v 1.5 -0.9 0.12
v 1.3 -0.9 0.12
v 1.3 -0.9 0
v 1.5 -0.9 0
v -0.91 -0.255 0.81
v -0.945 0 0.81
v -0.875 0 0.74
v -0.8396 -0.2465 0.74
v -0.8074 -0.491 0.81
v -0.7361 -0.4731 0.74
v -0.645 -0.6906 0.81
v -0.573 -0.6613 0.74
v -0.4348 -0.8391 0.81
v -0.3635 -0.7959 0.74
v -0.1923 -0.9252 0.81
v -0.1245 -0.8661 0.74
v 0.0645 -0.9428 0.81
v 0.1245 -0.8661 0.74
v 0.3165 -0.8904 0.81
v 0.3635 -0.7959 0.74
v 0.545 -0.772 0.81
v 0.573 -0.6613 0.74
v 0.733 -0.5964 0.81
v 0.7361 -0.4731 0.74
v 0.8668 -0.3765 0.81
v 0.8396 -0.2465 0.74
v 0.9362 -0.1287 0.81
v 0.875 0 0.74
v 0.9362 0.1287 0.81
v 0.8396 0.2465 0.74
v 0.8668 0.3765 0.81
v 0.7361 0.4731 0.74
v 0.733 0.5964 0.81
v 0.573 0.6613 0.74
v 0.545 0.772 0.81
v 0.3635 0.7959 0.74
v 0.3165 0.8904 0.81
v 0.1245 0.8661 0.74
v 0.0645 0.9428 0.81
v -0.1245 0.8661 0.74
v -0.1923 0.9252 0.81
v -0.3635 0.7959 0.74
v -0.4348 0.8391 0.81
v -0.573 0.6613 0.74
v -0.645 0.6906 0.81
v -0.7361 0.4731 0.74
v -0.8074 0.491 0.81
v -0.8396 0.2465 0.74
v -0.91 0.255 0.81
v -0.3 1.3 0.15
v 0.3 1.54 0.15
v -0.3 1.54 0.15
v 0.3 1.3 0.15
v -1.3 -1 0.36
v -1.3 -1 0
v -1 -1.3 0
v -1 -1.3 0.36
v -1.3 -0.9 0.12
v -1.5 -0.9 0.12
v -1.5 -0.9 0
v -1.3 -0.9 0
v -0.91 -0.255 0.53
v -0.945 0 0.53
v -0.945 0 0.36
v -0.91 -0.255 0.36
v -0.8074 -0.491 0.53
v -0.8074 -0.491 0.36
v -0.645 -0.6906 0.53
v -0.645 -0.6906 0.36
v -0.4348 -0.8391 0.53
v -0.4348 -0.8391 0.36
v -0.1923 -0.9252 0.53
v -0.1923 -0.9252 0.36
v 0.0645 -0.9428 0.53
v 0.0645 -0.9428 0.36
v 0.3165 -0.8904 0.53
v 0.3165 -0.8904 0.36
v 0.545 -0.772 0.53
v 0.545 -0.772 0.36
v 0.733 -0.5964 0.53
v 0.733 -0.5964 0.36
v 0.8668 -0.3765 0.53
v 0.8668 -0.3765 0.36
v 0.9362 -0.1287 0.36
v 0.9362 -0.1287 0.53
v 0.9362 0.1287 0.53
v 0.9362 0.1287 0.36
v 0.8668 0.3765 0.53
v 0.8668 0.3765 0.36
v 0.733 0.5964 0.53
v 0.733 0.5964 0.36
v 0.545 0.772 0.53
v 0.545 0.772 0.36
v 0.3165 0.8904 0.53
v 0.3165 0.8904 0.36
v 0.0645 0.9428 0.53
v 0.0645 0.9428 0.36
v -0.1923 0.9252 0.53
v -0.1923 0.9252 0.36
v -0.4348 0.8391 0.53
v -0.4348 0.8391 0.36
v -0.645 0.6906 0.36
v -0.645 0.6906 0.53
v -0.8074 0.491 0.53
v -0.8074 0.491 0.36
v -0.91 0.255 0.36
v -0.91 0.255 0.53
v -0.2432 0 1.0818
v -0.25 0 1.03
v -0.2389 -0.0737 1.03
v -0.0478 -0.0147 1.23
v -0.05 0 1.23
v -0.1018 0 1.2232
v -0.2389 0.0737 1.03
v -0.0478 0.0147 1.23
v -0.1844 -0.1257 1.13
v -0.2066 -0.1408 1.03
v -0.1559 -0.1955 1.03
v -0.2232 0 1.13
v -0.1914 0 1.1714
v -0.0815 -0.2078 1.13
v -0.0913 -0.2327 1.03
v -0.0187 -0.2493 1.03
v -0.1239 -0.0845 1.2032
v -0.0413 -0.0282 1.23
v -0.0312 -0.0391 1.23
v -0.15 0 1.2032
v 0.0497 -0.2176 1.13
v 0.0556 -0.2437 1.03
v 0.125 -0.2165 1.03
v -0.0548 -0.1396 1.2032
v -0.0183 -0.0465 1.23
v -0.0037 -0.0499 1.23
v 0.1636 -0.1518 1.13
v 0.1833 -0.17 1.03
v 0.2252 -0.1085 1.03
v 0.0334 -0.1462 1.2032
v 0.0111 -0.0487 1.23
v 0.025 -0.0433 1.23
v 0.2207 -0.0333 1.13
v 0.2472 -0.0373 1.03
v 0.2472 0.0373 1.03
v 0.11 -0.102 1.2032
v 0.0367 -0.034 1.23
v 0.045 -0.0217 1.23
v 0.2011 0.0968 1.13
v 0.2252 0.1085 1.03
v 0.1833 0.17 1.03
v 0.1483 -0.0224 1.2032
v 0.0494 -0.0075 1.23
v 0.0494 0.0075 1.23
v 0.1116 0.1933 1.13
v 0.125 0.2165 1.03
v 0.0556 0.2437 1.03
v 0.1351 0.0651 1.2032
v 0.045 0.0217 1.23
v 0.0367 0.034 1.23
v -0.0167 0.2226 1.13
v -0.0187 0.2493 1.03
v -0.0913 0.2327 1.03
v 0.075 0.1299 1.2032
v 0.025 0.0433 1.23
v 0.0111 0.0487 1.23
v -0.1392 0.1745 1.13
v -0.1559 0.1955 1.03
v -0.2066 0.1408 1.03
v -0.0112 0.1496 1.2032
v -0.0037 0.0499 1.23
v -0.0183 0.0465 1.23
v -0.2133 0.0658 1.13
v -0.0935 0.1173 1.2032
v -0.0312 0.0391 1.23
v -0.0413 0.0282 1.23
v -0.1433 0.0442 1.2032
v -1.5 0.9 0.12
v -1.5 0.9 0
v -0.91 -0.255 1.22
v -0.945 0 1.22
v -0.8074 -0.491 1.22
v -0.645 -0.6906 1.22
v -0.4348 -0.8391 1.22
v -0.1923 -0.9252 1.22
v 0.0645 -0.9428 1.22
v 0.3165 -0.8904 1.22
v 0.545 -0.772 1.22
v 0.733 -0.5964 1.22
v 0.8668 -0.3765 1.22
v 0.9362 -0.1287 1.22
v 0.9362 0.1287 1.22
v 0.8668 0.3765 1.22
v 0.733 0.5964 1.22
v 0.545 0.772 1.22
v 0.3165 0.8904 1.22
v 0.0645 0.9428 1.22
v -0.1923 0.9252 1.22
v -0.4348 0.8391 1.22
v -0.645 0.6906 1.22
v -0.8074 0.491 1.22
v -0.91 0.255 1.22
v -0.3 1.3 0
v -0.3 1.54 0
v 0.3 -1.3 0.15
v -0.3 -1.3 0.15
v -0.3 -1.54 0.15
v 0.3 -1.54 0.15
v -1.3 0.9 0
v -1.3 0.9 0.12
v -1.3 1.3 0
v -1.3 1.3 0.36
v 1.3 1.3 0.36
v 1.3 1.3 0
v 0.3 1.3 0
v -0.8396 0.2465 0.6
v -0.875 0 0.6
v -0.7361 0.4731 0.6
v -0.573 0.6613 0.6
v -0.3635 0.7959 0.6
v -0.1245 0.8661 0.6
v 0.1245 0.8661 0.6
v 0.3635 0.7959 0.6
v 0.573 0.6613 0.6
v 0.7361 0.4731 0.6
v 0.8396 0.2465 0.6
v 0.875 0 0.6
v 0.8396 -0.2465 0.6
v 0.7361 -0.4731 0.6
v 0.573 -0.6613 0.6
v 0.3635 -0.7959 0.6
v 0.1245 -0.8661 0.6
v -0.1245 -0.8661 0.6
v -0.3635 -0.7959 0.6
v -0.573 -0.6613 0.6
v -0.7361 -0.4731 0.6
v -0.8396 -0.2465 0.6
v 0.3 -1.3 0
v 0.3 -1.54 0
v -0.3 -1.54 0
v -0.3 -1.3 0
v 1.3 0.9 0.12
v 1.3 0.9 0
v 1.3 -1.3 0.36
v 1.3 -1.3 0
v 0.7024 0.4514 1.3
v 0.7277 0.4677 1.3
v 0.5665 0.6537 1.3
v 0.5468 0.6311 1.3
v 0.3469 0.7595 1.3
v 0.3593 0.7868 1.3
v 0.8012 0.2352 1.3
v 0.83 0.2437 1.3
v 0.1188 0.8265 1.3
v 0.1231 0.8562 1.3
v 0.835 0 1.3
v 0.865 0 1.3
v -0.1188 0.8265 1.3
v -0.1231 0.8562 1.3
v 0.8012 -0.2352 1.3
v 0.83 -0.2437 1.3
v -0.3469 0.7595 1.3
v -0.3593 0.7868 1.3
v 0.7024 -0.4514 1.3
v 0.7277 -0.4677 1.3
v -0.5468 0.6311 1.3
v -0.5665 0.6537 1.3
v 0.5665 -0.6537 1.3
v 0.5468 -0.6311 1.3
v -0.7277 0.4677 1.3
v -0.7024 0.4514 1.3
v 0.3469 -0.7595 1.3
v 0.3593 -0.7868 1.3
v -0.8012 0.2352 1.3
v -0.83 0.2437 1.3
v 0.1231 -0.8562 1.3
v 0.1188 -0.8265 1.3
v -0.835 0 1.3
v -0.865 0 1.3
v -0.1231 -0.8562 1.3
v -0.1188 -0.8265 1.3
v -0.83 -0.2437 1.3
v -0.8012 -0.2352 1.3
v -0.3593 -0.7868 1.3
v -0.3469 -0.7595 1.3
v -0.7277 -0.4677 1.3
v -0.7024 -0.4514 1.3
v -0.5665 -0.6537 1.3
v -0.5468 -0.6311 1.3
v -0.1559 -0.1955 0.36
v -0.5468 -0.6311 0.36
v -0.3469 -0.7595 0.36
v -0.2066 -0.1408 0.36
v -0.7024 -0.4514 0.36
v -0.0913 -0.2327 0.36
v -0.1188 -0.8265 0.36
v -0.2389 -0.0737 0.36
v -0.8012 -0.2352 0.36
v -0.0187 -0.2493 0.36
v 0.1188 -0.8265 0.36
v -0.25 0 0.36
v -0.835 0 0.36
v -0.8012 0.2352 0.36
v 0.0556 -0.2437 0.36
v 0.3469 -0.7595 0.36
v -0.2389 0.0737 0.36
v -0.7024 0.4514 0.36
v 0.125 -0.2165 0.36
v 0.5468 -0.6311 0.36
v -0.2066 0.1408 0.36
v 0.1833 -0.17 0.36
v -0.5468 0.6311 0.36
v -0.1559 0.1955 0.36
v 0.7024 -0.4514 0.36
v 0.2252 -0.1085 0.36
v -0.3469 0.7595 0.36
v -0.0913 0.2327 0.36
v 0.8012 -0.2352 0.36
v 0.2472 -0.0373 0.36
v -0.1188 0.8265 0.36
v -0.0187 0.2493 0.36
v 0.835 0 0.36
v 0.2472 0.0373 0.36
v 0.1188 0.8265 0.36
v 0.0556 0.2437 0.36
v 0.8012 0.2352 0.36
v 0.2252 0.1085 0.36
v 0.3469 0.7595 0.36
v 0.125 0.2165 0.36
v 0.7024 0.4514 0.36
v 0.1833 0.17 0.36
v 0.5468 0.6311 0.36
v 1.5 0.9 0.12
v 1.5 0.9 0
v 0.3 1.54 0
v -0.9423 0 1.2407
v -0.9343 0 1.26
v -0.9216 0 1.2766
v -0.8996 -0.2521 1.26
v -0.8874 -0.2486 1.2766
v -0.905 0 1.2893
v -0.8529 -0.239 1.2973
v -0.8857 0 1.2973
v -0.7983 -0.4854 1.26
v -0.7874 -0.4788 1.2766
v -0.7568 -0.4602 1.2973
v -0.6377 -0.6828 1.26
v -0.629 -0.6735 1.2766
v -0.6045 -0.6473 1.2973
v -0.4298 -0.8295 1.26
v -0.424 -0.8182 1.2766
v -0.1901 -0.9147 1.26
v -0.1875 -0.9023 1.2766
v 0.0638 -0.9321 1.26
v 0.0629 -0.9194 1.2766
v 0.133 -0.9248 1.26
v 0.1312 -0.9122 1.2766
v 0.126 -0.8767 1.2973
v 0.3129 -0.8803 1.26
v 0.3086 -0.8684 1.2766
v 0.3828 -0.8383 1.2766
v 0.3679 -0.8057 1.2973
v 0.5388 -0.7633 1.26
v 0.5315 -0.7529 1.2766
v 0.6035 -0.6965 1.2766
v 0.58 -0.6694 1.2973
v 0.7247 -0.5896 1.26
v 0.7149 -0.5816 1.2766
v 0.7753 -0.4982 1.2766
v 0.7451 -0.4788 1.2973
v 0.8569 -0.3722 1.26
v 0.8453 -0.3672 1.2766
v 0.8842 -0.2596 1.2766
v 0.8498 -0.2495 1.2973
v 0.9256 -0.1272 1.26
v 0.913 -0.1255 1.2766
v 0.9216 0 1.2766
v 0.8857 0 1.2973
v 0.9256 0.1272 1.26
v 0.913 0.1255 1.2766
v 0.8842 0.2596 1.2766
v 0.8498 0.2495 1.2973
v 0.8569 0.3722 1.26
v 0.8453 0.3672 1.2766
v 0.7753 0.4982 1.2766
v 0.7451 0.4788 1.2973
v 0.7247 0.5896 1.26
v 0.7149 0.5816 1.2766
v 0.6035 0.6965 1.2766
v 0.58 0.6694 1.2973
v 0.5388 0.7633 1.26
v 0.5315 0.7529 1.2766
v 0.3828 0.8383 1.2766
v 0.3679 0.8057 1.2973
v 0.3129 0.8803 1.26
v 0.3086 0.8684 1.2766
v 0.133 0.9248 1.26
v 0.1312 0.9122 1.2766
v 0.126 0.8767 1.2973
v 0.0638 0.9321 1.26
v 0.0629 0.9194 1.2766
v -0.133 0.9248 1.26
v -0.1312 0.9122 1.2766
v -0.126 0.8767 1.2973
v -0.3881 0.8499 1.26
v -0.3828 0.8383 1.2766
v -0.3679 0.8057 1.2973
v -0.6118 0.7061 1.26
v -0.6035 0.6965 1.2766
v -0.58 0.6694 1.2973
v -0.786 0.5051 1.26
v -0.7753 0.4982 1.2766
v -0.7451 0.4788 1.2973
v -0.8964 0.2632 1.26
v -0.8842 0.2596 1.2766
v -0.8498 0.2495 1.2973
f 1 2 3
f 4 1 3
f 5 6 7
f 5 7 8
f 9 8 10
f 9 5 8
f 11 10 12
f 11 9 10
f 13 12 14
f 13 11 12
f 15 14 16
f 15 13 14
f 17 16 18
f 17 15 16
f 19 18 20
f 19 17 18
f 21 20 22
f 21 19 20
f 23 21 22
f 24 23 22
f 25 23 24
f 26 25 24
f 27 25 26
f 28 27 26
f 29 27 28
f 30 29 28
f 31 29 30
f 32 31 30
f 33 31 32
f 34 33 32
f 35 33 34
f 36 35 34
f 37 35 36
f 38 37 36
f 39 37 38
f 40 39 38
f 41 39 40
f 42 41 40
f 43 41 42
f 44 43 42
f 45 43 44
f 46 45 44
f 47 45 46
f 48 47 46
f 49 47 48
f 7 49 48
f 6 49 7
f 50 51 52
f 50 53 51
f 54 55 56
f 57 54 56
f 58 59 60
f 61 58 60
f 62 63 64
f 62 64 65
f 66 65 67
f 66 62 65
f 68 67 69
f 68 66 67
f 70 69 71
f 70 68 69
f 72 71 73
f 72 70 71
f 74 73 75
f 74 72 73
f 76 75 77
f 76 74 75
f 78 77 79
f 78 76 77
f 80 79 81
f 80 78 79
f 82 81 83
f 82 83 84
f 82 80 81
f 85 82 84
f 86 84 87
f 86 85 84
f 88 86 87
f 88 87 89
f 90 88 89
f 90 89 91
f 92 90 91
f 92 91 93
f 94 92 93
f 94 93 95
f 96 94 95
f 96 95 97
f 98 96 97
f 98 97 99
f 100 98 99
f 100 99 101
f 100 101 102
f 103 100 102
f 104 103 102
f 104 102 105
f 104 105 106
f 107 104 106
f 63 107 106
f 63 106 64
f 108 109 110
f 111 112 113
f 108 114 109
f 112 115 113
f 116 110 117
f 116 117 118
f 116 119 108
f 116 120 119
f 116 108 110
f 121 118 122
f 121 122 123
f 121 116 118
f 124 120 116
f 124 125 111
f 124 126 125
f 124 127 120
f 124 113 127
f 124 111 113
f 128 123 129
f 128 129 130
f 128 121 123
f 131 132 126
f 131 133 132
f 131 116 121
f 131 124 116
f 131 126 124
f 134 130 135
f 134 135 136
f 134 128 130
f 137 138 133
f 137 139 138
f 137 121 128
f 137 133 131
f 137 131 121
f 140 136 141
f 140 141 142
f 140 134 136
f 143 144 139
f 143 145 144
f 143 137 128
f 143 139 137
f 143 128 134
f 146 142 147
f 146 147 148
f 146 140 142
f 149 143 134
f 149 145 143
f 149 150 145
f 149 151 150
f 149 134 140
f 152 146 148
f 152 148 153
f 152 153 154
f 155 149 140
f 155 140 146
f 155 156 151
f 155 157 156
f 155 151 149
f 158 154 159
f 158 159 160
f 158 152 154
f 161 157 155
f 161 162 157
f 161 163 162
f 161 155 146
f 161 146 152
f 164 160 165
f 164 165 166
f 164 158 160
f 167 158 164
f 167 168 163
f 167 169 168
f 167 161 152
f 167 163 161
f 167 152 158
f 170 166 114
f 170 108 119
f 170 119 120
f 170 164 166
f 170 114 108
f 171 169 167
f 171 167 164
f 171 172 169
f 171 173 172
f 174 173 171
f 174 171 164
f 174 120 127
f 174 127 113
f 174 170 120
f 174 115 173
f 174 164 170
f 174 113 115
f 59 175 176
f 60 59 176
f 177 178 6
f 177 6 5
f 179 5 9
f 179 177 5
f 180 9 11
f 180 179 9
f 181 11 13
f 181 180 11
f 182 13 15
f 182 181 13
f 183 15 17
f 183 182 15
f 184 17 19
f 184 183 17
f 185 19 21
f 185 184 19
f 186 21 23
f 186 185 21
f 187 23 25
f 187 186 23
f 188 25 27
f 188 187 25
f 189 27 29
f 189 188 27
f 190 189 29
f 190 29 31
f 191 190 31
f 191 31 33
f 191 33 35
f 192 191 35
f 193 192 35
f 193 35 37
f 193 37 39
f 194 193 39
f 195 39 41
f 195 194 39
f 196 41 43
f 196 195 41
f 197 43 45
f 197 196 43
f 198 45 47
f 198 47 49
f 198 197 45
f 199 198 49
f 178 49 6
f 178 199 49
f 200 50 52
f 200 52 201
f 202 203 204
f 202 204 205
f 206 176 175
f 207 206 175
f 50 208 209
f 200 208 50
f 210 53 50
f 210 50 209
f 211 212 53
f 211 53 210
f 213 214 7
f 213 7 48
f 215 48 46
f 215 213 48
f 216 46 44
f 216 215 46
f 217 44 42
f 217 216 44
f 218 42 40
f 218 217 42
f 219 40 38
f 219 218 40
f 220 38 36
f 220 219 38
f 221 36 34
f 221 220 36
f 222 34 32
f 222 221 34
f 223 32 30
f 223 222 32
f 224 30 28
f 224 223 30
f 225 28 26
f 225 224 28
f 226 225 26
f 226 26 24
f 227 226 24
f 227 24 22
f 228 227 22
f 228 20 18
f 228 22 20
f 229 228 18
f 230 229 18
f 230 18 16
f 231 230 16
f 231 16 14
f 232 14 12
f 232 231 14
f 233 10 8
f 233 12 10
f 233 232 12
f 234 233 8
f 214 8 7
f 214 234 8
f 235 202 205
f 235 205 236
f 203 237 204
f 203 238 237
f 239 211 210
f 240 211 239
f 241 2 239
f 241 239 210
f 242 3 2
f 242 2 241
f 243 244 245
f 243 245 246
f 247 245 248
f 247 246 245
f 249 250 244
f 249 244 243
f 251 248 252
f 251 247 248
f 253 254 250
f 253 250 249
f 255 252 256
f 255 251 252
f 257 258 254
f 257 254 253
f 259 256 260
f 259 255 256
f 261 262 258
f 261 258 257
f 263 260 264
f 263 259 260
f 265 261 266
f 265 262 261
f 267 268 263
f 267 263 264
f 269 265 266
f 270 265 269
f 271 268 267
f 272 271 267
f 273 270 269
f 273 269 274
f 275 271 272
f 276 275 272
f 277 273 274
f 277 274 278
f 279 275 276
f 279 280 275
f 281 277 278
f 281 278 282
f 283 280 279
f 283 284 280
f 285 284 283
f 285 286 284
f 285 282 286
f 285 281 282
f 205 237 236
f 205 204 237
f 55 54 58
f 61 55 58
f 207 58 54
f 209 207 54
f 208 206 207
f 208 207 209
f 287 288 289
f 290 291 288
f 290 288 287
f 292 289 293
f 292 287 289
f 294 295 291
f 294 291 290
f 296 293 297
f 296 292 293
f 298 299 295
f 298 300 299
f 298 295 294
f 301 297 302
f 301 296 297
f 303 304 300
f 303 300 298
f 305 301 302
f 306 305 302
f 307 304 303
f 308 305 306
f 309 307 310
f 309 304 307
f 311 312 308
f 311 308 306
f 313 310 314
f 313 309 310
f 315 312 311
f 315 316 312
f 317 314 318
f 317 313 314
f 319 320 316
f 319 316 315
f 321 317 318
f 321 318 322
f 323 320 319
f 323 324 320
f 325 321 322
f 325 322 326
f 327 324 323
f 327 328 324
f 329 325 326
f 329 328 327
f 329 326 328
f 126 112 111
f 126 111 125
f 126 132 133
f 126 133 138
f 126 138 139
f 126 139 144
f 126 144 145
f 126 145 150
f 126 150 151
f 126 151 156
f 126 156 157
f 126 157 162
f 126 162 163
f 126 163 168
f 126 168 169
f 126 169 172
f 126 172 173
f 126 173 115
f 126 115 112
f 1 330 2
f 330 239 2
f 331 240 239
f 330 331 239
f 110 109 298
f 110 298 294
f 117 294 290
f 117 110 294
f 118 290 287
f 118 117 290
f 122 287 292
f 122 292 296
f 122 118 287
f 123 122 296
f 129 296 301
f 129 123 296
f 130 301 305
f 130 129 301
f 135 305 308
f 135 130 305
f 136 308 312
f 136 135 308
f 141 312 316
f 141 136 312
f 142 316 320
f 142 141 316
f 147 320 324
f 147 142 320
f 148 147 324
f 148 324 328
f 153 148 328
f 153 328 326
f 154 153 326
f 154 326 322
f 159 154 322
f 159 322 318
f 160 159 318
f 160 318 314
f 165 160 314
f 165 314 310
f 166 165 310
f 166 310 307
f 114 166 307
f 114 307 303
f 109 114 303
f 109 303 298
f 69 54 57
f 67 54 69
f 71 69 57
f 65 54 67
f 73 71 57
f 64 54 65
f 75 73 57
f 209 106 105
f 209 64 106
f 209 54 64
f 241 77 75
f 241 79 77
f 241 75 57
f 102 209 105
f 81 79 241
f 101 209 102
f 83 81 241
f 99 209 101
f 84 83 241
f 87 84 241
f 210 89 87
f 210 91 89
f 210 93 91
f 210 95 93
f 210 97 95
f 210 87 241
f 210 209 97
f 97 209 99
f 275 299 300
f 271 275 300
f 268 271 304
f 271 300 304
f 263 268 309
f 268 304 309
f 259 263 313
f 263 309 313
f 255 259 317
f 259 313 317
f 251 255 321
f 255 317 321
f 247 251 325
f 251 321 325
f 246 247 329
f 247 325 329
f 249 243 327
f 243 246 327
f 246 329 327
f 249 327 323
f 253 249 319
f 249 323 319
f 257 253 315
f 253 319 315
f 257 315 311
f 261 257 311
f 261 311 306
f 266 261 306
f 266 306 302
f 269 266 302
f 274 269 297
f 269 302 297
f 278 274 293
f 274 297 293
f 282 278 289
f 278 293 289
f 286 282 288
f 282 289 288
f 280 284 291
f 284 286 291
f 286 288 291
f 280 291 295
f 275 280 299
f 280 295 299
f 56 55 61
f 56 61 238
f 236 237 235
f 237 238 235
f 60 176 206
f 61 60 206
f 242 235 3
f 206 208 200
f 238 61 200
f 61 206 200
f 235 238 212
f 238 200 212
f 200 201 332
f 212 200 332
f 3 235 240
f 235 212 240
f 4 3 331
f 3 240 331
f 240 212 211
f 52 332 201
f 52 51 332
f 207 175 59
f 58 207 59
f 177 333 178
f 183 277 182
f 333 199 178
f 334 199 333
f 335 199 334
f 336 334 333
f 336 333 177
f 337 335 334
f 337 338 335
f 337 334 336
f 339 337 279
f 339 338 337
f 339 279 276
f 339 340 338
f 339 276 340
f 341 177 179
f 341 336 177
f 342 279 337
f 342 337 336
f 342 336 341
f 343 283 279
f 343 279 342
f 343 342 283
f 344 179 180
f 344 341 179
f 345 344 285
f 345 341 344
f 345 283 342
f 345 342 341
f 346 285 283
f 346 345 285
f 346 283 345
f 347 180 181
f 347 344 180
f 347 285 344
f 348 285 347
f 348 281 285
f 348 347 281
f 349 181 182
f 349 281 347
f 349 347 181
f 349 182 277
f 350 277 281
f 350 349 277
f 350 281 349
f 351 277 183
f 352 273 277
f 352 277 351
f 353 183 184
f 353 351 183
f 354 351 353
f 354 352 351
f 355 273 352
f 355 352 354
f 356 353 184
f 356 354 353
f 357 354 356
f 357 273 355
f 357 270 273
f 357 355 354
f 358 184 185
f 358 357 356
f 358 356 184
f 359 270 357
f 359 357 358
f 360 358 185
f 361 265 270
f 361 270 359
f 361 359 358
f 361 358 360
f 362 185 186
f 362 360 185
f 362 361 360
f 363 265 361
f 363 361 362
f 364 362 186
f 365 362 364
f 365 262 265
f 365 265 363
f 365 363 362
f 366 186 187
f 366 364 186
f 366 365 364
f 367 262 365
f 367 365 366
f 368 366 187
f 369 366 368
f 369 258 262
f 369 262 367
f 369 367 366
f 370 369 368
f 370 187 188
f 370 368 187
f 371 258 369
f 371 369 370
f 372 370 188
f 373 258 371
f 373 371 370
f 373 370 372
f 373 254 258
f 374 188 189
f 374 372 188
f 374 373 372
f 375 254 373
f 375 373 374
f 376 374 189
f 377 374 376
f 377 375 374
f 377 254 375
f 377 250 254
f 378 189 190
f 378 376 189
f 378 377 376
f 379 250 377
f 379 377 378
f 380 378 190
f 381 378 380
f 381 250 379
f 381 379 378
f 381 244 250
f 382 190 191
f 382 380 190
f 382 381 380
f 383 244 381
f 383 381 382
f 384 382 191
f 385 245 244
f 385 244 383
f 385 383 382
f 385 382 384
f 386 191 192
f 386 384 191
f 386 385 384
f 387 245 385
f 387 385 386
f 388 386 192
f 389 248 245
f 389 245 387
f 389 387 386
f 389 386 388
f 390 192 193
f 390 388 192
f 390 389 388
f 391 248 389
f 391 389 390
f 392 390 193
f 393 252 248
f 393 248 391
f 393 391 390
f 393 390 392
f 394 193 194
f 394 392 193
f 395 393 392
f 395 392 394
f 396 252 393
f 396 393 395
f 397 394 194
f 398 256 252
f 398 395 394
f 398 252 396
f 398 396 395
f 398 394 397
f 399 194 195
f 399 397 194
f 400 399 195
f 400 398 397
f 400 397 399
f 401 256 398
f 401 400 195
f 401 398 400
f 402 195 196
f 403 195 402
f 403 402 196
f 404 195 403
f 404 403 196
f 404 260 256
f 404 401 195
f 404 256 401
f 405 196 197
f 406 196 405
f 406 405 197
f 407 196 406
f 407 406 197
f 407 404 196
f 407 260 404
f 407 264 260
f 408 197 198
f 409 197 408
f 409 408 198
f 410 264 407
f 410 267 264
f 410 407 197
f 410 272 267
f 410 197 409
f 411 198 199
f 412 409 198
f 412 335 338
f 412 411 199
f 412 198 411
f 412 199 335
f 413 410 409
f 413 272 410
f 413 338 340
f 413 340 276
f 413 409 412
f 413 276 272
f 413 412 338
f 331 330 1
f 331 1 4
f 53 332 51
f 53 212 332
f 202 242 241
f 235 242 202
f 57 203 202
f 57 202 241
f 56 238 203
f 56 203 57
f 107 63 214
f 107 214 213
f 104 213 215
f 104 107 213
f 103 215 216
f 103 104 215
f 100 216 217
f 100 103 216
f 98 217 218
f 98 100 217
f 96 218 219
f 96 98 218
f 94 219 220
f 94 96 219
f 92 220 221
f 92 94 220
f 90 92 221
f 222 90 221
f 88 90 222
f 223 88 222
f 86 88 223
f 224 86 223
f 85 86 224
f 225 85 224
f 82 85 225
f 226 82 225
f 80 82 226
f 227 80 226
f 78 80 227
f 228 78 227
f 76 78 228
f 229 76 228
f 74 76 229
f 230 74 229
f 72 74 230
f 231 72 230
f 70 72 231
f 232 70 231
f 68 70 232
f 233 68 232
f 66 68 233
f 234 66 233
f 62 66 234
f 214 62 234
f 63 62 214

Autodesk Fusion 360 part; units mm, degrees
sketch "Sketch1" plane through (0, 0, 0) normal (0, 0, 1) x (1, 0, 0)
  line L0 (-1.3, 1.3) -> (1.3, 1.3)
  line L1 (1.3, 1.3) -> (1.3, -1.3)
  line L2 (1.3, -1.3) -> (-1.3, -1.3)
  line L3 (-1.3, -1.3) -> (-1.3, 1.3)
  line L4 (-1.3, -1) -> (-1, -1.3)
  line L5 (-1.3, -1) -> (-0.9678, -1) construction
  dimension "d1" = 2.6
  dimension "d2" = 2.6
  dimension "d3" = 1.3
  dimension "d4" = 1.3
  dimension "d5" = 45
  dimension "d7" = 1
extrude "Extrude1" add sketch "Sketch1" along normal blind 0.36 contours L0 L1 L2 L3 L4
sketch "Sketch2" plane through (0, 1.3, 0) normal (0, 1, 0) x (-1, 0, 0)
  line L0 (-1.3, 0) -> (1.3, 0)
  line L1 (1.3, 0) -> (1.3, 0.36)
  line L2 (1.3, 0.36) -> (-1.3, 0.36)
  line L3 (-1.3, 0.36) -> (-1.3, 0)
  line L4 (-0.3, 0.15) -> (0.3, 0.15)
  line L5 (0.3, 0.15) -> (0.3, 0)
  line L6 (0.3, 0) -> (-0.3, 0)
  line L7 (-0.3, 0) -> (-0.3, 0.15)
  dimension "d10" = 0.6
  dimension "d11" = 0.3
  dimension "d12" = 0.15
extrude "Extrude2" add sketch "Sketch2" along normal blind 0.24 contours L0 L4 L5 L6 L7
sketch "Sketch3" plane through (0, -1.3, 0) normal (0, -1, 0) x (1, 0, 0)
  line L0 (-1, 0) -> (1.3, 0)
  line L1 (1.3, 0) -> (1.3, 0.36)
  line L2 (1.3, 0.36) -> (-1, 0.36)
  line L3 (-1, 0.36) -> (-1, 0)
  line L4 (-0.3, 0.15) -> (0.3, 0.15)
  line L5 (0.3, 0.15) -> (0.3, 0)
  line L6 (0.3, 0) -> (-0.3, 0)
  line L7 (-0.3, 0) -> (-0.3, 0.15)
  dimension "d15" = 0.6
  dimension "d16" = 0.3
  dimension "d17" = 0.15
extrude "Extrude3" add sketch "Sketch3" along normal blind 0.24 contours L0 L4 L5 L6 L7
sketch "Sketch4" plane through (1.3, 0, 0) normal (1, 0, 0) x (0, 0, -1)
  line L0 (0, -1.3) -> (0, 1.3)
  line L1 (0, 1.3) -> (-0.36, 1.3)
  line L2 (-0.36, 1.3) -> (-0.36, -1.3)
  line L3 (-0.36, -1.3) -> (0, -1.3)
  line L4 (-0.12, -0.9) -> (0, -0.9)
  line L5 (0, -0.9) -> (0, 0.9)
  line L6 (0, 0.9) -> (-0.12, 0.9)
  line L7 (-0.12, 0.9) -> (-0.12, -0.9)
  dimension "d20" = 1.8
  dimension "d21" = 0.9
  dimension "d22" = 0.12
extrude "Extrude4" add sketch "Sketch4" along normal blind 0.2 and the other way blind 2.8 contours L0 L4 L5 L6 L7
sketch "Sketch5" plane through (0, 0, 0) normal (0, 1, 0) x (1, 0, 0)
  line L0 (-0.945, -0.36) -> (-0.945, -1.22)
  line L1 (-0.865, -1.3) -> (-0.835, -1.3)
  line L2 (-0.835, -1.3) -> (-0.835, -0.36)
  line L3 (-1, -0.36) -> (1.3, -0.36)
  line L4 (-0.945, -0.81) -> (-0.875, -0.74)
  line L5 (-0.875, -0.74) -> (-0.875, -0.6)
  line L6 (-0.875, -0.6) -> (-0.945, -0.53)
  arc A0 (-0.945, -1.22) -> (-0.865, -1.3) centre (-0.865, -1.22) ccw
  line L7 (-0.05, -1.23) -> (0, -1.23)
  line L8 (0, -1.23) -> (0, -0.36)
  line L9 (0, -0.36) -> (-0.25, -0.36)
  line L10 (-0.25, -0.36) -> (-0.25, -1.03)
  arc A1 (-0.25, -1.03) -> (-0.05, -1.23) centre (-0.05, -1.03) ccw
  point P0 (-0.25, -1.23)
  dimension "d27" = 0.94
  dimension "d28" = 0.11
  dimension "d29" = 0.28
  dimension "d30" = 0.49
  dimension "d31" = 135
  dimension "d32" = 0.14
  dimension "d33" = 0.945
  dimension "d34" = 0.08
  dimension "d35" = 1.23
  dimension "d36" = 0.25
  dimension "d37" = 0.25
  dimension "d38" = 0.2
revolve "Revolve1" add sketch "Sketch5" angle 360 about axis through (0, 0, 1.75) along (0, 0, 1) contours L0 L1 L2 L3 L4 L5 L6 A0 | L3 L7 L8 L9 L10 A1
equation "d3 = d1 / 2"
equation "d4 = d2 / 2"
equation "d11 = d10 / 2"
equation "d16 = d15 / 2"
equation "d21 = d20 / 2"
equation "d33 = 1 mm - d28 / 2"
